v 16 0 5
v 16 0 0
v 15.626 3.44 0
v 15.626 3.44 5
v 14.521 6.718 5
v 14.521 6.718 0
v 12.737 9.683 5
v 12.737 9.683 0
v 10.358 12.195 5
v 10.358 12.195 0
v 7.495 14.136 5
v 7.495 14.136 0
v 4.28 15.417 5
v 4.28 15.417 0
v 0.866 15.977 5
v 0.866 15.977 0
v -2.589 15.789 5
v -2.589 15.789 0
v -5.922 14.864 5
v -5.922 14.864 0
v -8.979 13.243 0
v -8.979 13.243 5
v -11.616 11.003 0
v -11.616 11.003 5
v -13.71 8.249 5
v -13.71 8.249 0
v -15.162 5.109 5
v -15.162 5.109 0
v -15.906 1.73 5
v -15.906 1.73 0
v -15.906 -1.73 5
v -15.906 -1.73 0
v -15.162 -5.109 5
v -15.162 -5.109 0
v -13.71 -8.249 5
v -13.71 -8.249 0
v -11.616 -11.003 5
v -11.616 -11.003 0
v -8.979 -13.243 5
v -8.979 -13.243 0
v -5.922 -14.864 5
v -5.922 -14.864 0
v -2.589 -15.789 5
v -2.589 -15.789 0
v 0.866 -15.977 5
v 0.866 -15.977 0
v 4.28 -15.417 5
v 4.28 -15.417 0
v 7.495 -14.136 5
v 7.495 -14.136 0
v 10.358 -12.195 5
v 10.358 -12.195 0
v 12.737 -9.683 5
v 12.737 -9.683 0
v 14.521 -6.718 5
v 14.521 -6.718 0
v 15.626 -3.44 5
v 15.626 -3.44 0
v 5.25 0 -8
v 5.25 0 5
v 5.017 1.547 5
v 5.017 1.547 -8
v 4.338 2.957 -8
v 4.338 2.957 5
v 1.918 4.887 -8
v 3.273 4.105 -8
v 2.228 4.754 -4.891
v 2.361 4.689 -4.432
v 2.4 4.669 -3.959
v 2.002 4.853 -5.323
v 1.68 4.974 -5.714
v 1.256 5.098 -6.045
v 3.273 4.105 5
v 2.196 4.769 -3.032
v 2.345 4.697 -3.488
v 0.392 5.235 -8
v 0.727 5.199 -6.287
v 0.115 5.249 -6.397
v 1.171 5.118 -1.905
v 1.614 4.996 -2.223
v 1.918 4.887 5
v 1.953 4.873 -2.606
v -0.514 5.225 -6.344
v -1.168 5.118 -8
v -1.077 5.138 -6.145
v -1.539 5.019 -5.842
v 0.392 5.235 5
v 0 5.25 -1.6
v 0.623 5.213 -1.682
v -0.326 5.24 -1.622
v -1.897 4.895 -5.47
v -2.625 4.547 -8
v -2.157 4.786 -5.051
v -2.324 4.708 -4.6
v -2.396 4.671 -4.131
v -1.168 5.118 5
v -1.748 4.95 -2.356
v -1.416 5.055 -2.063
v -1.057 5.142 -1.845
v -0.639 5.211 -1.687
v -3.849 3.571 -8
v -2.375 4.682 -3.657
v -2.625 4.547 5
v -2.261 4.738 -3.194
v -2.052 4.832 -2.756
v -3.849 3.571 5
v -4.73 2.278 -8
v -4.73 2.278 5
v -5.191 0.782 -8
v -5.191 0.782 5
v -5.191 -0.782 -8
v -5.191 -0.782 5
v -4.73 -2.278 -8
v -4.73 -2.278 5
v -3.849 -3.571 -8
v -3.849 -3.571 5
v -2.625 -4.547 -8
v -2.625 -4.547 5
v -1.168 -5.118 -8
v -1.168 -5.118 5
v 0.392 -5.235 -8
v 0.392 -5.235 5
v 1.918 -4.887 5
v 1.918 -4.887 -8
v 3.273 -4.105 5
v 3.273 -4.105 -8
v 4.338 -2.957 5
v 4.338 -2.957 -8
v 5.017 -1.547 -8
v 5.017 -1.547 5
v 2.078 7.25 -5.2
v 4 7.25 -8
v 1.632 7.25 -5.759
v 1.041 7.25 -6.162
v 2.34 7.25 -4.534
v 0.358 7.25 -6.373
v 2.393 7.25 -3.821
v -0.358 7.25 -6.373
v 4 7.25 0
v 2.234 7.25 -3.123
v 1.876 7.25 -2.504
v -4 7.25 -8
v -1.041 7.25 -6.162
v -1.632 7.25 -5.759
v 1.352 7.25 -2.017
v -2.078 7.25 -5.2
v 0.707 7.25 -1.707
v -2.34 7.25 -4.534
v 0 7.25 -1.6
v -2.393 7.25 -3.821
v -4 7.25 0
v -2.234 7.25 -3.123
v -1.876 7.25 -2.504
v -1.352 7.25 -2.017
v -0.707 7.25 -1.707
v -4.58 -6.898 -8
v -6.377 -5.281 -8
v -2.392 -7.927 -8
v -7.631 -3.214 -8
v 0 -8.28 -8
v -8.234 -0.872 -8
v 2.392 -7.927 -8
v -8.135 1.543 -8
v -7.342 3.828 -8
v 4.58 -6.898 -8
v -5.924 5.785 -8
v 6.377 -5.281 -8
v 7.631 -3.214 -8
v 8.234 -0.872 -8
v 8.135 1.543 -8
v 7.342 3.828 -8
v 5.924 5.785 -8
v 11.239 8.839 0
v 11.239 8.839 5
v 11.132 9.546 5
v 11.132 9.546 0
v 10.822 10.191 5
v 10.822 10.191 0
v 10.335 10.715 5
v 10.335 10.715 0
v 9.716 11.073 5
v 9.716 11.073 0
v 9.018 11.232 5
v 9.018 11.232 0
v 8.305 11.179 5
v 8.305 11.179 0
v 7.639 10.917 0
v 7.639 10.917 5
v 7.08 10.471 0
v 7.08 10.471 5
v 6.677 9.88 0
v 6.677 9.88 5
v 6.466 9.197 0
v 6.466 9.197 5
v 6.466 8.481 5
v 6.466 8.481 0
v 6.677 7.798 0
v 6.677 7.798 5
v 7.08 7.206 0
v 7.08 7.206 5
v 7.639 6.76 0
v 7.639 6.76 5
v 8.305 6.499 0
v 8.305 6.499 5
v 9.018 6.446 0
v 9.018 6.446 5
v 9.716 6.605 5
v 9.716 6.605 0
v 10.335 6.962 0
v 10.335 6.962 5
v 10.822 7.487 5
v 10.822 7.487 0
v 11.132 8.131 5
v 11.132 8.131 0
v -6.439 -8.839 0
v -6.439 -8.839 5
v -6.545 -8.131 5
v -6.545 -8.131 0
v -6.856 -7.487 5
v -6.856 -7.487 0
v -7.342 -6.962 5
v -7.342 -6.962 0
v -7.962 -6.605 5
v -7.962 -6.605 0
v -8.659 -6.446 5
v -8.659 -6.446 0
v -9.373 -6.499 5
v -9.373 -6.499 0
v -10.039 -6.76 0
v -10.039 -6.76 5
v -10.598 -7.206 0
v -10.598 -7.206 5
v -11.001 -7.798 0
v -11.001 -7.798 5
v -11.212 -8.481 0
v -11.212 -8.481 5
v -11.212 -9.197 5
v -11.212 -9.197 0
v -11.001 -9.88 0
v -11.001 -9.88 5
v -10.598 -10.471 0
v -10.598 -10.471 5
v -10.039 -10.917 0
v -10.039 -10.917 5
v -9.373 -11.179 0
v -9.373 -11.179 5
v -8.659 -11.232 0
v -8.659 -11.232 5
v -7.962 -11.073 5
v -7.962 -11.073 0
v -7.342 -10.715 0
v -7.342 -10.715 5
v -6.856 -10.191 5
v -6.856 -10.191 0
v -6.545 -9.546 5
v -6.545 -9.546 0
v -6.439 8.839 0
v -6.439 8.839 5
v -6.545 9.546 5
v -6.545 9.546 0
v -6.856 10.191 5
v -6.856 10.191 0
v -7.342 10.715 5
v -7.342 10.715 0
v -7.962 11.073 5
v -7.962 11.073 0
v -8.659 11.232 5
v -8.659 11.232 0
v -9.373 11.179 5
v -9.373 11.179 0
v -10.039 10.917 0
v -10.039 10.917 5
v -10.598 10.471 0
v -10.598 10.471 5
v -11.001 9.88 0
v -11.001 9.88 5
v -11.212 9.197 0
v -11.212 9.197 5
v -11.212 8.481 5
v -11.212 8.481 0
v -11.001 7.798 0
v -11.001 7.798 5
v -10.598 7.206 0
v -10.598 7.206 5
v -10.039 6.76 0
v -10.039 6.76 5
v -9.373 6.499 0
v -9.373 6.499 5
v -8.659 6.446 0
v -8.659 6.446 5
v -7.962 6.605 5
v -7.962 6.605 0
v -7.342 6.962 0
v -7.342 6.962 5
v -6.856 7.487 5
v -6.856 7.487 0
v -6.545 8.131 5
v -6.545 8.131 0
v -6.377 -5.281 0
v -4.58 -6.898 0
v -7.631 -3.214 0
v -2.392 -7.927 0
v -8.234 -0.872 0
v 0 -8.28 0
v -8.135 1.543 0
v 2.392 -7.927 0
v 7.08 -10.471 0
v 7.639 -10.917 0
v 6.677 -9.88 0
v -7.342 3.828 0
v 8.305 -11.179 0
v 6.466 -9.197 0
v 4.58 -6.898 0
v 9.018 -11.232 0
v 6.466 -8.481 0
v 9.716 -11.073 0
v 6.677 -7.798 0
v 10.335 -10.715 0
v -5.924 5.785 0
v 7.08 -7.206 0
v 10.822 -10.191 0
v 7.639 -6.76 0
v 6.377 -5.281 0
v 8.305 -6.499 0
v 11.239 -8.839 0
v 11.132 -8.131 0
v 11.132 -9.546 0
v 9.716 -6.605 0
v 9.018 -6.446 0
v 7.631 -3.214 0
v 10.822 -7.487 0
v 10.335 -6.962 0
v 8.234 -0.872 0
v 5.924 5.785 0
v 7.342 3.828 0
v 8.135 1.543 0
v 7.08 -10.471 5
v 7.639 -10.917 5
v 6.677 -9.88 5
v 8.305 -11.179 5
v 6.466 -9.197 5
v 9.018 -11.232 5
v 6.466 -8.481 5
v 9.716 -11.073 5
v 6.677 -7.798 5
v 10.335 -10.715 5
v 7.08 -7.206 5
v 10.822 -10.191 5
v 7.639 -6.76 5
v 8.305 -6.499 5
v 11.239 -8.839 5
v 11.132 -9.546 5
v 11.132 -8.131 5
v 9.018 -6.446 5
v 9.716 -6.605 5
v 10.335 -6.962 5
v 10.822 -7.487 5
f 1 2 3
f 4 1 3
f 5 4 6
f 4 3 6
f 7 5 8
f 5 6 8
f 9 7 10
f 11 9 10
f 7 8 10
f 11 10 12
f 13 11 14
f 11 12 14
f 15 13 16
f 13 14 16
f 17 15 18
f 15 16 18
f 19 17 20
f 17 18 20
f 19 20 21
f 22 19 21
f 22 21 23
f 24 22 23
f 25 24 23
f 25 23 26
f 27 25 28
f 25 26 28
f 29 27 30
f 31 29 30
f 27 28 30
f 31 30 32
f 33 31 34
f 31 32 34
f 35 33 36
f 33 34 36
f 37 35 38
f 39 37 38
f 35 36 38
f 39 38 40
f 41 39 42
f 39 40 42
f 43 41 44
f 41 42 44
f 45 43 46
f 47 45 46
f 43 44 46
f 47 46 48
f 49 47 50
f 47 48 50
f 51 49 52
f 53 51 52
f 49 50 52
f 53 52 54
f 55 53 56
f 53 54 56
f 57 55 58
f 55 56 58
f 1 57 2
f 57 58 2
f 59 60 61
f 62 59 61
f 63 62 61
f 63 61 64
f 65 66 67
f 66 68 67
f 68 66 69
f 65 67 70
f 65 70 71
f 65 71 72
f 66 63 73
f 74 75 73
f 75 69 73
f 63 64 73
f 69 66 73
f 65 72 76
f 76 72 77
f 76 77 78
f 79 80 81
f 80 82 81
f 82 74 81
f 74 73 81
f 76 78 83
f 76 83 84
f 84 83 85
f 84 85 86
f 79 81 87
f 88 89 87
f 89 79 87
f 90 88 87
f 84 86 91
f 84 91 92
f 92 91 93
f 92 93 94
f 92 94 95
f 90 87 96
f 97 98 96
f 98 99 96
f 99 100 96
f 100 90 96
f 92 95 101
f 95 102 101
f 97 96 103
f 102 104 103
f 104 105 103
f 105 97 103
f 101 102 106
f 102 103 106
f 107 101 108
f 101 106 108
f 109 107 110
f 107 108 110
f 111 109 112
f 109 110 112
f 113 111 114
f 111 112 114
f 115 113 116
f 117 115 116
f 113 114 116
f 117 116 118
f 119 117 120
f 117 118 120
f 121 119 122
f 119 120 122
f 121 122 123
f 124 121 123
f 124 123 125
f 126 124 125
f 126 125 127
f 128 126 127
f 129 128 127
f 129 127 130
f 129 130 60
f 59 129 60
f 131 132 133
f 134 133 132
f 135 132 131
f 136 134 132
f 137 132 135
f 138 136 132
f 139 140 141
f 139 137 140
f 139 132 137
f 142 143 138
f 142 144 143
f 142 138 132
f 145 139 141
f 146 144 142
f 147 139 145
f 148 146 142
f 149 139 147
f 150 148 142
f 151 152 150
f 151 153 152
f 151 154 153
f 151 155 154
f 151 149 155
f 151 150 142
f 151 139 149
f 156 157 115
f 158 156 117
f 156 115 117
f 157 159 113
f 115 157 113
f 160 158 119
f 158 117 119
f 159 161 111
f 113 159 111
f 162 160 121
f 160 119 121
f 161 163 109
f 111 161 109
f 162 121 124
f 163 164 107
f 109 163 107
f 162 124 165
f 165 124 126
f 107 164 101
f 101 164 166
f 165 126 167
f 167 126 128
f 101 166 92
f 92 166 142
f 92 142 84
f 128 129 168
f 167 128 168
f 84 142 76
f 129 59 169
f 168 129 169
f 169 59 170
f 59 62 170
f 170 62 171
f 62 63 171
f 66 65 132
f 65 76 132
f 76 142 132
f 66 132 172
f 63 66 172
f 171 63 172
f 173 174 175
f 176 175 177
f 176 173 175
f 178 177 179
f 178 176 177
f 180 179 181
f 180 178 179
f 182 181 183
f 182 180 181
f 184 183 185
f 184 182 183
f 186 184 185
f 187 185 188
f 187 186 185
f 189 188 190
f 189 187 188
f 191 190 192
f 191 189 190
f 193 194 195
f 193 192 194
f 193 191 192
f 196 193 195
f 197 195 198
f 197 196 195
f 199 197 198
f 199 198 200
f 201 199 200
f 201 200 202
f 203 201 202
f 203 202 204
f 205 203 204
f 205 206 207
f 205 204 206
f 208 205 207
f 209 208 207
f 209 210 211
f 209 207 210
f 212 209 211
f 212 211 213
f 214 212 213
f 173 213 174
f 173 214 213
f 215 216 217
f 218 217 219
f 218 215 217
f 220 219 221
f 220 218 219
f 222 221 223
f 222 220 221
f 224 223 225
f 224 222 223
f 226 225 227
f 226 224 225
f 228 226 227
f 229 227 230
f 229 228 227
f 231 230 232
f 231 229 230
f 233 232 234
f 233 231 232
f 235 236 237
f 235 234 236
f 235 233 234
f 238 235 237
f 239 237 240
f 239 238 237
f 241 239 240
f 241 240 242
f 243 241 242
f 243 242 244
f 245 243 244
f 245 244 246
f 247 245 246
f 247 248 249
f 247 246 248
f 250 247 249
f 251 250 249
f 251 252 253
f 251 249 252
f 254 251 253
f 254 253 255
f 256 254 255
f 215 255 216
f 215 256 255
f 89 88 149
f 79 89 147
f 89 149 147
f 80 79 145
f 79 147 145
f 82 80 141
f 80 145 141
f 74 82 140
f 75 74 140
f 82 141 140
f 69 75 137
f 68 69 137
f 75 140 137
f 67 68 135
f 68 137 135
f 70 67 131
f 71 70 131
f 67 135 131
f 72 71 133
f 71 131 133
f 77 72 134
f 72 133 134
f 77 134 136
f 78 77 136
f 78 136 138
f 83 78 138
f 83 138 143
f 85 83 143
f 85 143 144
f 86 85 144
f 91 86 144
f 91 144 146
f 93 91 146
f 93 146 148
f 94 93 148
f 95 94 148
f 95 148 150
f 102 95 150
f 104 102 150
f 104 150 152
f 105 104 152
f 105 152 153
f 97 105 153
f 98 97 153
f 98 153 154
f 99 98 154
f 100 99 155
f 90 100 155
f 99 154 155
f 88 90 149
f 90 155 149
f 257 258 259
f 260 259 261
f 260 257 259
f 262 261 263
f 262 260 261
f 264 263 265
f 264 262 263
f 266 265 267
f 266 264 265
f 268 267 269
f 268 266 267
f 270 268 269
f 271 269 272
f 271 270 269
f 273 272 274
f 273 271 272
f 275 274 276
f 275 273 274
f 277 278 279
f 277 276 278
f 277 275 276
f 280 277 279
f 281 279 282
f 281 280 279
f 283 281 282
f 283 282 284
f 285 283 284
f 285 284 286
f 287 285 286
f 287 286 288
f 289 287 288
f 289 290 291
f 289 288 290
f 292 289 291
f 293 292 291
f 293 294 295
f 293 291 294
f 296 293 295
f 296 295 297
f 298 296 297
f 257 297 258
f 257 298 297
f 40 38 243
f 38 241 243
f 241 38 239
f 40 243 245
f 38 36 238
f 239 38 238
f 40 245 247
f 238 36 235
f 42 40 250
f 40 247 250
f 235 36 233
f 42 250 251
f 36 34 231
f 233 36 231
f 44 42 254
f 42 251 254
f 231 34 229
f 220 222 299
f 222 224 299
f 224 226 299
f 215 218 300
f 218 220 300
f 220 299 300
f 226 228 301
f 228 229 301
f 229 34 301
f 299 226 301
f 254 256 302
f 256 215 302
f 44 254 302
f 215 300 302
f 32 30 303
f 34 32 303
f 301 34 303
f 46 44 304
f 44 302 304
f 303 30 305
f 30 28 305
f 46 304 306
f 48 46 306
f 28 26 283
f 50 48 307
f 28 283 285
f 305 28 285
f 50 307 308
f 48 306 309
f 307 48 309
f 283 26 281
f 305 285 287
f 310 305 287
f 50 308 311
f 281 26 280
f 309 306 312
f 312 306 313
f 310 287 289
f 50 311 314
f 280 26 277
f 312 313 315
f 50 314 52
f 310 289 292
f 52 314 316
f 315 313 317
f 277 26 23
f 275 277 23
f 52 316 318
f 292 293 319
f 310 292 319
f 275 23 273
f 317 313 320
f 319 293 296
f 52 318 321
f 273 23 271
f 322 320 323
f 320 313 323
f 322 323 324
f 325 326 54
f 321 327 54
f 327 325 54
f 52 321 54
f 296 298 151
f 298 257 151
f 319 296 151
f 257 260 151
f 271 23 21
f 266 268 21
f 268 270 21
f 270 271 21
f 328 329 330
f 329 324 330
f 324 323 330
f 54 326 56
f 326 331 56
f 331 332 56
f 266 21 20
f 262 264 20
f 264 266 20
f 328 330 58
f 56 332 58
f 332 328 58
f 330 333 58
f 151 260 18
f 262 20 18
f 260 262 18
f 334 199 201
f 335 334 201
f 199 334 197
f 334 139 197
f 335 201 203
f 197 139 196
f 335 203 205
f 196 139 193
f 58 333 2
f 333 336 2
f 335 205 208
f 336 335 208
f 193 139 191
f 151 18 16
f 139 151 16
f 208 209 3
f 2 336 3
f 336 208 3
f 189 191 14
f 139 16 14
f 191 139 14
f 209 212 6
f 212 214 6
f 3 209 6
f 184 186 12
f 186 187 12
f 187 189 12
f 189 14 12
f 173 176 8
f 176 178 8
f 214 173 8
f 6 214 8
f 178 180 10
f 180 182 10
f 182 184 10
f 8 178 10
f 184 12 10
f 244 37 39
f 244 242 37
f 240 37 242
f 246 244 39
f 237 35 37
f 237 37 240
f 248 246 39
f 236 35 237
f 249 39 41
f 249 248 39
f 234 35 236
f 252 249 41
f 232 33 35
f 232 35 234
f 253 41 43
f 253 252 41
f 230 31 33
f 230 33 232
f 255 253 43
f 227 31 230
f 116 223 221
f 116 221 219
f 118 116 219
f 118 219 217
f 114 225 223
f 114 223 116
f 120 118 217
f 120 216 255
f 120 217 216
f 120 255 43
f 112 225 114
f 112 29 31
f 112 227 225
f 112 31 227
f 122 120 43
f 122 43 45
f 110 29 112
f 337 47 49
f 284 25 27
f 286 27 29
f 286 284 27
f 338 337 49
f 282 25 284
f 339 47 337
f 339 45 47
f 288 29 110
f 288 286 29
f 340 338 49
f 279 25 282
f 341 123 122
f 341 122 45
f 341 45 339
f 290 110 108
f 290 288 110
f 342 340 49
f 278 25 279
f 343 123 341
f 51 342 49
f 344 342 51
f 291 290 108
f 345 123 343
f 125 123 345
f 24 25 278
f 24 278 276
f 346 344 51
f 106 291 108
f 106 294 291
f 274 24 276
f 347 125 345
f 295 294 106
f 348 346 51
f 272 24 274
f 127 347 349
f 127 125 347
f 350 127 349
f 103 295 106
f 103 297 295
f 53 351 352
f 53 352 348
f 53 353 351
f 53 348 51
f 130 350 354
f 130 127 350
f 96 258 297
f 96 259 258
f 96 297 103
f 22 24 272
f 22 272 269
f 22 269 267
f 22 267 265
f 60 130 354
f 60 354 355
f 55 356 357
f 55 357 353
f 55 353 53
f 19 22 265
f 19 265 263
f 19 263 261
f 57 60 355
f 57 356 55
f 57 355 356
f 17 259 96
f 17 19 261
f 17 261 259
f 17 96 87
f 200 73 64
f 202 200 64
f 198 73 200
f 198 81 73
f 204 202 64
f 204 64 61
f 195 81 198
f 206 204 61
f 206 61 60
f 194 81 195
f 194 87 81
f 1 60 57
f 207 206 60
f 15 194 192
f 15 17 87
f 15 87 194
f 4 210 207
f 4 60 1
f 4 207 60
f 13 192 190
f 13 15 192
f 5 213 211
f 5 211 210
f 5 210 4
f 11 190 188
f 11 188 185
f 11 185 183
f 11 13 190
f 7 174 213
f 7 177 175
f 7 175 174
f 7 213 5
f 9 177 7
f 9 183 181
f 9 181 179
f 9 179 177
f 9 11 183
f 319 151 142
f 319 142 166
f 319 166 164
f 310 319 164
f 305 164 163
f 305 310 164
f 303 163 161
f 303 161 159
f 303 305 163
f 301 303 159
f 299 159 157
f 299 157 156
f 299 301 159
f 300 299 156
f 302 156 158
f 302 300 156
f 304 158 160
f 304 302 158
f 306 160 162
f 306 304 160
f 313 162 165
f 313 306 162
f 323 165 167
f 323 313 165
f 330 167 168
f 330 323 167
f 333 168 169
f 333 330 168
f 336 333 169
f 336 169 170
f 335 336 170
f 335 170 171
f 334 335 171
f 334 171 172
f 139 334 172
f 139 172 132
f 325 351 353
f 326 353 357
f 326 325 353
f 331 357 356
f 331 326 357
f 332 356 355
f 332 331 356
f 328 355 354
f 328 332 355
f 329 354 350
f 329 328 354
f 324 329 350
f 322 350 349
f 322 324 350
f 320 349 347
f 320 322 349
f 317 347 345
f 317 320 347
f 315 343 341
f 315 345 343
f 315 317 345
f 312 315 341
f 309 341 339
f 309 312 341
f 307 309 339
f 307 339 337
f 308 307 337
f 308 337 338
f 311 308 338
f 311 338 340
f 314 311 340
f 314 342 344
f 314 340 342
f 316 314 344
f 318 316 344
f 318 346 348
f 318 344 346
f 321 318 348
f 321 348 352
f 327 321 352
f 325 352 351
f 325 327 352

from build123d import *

# Parameters (mm, degrees)
SKETCH12_R              = 16
BOSS_EXTRUDE3_DEPTH     = 5
CUT_EXTRUDE3_REACH      = 25.173
SKETCH14_R              = 2.4
BOSS_EXTRUDE4_DEPTH     = 8
SKETCH15_R              = 5.25
CUT_EXTRUDE4_DEPTH      = 10
CUT_EXTRUDE5_REACH      = 31.335
CUT_EXTRUDE5_END_RADIUS = 5.25
SKETCH17_R              = 2.4


with BuildPart() as part:
    # Sketch12 → Boss-Extrude3 (new body)
    with BuildSketch(Plane.XY):
        Circle(SKETCH12_R)
    extrude(amount=BOSS_EXTRUDE3_DEPTH)

    # Sketch14 → Cut-Extrude3 (cut, up to next)
    with BuildSketch(Plane.XY, mode=Mode.PRIVATE) as cut_extrude3_sk1:
        with Locations((8.838834765, 8.838834765)):
            Circle(SKETCH14_R)
    cut_extrude3_tool1 = extrude(cut_extrude3_sk1.sketch, amount=CUT_EXTRUDE3_REACH, mode=Mode.PRIVATE) & part.part
    # Sketch14 → Cut-Extrude3 (cut, up to next)
    with BuildSketch(Plane.XY, mode=Mode.PRIVATE) as cut_extrude3_sk2:
        with Locations((-8.838834765, 8.838834765)):
            Circle(SKETCH14_R)
    cut_extrude3_tool2 = extrude(cut_extrude3_sk2.sketch, amount=CUT_EXTRUDE3_REACH, mode=Mode.PRIVATE) & part.part
    # Sketch14 → Cut-Extrude3 (cut, up to next)
    with BuildSketch(Plane.XY, mode=Mode.PRIVATE) as cut_extrude3_sk3:
        with Locations((8.838834765, -8.838834765)):
            Circle(SKETCH14_R)
    cut_extrude3_tool3 = extrude(cut_extrude3_sk3.sketch, amount=CUT_EXTRUDE3_REACH, mode=Mode.PRIVATE) & part.part
    # Sketch14 → Cut-Extrude3 (cut, up to next)
    with BuildSketch(Plane.XY, mode=Mode.PRIVATE) as cut_extrude3_sk4:
        with Locations((-8.838834765, -8.838834765)):
            Circle(SKETCH14_R)
    cut_extrude3_tool4 = extrude(cut_extrude3_sk4.sketch, amount=CUT_EXTRUDE3_REACH, mode=Mode.PRIVATE) & part.part
    add(cut_extrude3_tool1.solids().sort_by_distance((8.838835, 8.838835, 0))[0], mode=Mode.SUBTRACT)
    add(cut_extrude3_tool2.solids().sort_by_distance((-8.838835, 8.838835, 0))[0], mode=Mode.SUBTRACT)
    add(cut_extrude3_tool3.solids().sort_by_distance((8.838835, -8.838835, 0))[0], mode=Mode.SUBTRACT)
    add(cut_extrude3_tool4.solids().sort_by_distance((-8.838835, -8.838835, 0))[0], mode=Mode.SUBTRACT)

    # Sketch16 → Boss-Extrude4 (add)
    with BuildSketch(Plane.XY):
        with BuildLine():
            Line((4, 7.25), (-4, 7.25))
            ThreePointArc((-4, 7.25), (0, -8.280247581), (4, 7.25))
        make_face()
    extrude(amount=-BOSS_EXTRUDE4_DEPTH)

    # Sketch15 → Cut-Extrude4 (cut, symmetric)
    with BuildSketch(Plane.XY):
        Circle(SKETCH15_R)
    extrude(amount=CUT_EXTRUDE4_DEPTH, both=True, mode=Mode.SUBTRACT)

    # Cut-Extrude5: up to this cylinder (the profile starts outside it)
    cut_extrude5_end = Plane(origin=(0, 0, -4), z_dir=(0, 0, 1)) * Cylinder(CUT_EXTRUDE5_END_RADIUS, 74.17, mode=Mode.PRIVATE)
    # Sketch17 → Cut-Extrude5 (cut, up to the surface)
    with BuildSketch(Plane(origin=(0, 7.25, 0), x_dir=(1, 0, 0), z_dir=(0, 1, 0)), mode=Mode.PRIVATE) as cut_extrude5_sk1:
        with Locations(Location((0, 4, 0), (0, 0, 270))):
            Circle(SKETCH17_R)
    cut_extrude5_tool1 = extrude(cut_extrude5_sk1.sketch, amount=-CUT_EXTRUDE5_REACH, mode=Mode.PRIVATE) - cut_extrude5_end
    add(cut_extrude5_tool1.solids().sort_by_distance((0, 7.25, -4))[0], mode=Mode.SUBTRACT)


solid = part.part
